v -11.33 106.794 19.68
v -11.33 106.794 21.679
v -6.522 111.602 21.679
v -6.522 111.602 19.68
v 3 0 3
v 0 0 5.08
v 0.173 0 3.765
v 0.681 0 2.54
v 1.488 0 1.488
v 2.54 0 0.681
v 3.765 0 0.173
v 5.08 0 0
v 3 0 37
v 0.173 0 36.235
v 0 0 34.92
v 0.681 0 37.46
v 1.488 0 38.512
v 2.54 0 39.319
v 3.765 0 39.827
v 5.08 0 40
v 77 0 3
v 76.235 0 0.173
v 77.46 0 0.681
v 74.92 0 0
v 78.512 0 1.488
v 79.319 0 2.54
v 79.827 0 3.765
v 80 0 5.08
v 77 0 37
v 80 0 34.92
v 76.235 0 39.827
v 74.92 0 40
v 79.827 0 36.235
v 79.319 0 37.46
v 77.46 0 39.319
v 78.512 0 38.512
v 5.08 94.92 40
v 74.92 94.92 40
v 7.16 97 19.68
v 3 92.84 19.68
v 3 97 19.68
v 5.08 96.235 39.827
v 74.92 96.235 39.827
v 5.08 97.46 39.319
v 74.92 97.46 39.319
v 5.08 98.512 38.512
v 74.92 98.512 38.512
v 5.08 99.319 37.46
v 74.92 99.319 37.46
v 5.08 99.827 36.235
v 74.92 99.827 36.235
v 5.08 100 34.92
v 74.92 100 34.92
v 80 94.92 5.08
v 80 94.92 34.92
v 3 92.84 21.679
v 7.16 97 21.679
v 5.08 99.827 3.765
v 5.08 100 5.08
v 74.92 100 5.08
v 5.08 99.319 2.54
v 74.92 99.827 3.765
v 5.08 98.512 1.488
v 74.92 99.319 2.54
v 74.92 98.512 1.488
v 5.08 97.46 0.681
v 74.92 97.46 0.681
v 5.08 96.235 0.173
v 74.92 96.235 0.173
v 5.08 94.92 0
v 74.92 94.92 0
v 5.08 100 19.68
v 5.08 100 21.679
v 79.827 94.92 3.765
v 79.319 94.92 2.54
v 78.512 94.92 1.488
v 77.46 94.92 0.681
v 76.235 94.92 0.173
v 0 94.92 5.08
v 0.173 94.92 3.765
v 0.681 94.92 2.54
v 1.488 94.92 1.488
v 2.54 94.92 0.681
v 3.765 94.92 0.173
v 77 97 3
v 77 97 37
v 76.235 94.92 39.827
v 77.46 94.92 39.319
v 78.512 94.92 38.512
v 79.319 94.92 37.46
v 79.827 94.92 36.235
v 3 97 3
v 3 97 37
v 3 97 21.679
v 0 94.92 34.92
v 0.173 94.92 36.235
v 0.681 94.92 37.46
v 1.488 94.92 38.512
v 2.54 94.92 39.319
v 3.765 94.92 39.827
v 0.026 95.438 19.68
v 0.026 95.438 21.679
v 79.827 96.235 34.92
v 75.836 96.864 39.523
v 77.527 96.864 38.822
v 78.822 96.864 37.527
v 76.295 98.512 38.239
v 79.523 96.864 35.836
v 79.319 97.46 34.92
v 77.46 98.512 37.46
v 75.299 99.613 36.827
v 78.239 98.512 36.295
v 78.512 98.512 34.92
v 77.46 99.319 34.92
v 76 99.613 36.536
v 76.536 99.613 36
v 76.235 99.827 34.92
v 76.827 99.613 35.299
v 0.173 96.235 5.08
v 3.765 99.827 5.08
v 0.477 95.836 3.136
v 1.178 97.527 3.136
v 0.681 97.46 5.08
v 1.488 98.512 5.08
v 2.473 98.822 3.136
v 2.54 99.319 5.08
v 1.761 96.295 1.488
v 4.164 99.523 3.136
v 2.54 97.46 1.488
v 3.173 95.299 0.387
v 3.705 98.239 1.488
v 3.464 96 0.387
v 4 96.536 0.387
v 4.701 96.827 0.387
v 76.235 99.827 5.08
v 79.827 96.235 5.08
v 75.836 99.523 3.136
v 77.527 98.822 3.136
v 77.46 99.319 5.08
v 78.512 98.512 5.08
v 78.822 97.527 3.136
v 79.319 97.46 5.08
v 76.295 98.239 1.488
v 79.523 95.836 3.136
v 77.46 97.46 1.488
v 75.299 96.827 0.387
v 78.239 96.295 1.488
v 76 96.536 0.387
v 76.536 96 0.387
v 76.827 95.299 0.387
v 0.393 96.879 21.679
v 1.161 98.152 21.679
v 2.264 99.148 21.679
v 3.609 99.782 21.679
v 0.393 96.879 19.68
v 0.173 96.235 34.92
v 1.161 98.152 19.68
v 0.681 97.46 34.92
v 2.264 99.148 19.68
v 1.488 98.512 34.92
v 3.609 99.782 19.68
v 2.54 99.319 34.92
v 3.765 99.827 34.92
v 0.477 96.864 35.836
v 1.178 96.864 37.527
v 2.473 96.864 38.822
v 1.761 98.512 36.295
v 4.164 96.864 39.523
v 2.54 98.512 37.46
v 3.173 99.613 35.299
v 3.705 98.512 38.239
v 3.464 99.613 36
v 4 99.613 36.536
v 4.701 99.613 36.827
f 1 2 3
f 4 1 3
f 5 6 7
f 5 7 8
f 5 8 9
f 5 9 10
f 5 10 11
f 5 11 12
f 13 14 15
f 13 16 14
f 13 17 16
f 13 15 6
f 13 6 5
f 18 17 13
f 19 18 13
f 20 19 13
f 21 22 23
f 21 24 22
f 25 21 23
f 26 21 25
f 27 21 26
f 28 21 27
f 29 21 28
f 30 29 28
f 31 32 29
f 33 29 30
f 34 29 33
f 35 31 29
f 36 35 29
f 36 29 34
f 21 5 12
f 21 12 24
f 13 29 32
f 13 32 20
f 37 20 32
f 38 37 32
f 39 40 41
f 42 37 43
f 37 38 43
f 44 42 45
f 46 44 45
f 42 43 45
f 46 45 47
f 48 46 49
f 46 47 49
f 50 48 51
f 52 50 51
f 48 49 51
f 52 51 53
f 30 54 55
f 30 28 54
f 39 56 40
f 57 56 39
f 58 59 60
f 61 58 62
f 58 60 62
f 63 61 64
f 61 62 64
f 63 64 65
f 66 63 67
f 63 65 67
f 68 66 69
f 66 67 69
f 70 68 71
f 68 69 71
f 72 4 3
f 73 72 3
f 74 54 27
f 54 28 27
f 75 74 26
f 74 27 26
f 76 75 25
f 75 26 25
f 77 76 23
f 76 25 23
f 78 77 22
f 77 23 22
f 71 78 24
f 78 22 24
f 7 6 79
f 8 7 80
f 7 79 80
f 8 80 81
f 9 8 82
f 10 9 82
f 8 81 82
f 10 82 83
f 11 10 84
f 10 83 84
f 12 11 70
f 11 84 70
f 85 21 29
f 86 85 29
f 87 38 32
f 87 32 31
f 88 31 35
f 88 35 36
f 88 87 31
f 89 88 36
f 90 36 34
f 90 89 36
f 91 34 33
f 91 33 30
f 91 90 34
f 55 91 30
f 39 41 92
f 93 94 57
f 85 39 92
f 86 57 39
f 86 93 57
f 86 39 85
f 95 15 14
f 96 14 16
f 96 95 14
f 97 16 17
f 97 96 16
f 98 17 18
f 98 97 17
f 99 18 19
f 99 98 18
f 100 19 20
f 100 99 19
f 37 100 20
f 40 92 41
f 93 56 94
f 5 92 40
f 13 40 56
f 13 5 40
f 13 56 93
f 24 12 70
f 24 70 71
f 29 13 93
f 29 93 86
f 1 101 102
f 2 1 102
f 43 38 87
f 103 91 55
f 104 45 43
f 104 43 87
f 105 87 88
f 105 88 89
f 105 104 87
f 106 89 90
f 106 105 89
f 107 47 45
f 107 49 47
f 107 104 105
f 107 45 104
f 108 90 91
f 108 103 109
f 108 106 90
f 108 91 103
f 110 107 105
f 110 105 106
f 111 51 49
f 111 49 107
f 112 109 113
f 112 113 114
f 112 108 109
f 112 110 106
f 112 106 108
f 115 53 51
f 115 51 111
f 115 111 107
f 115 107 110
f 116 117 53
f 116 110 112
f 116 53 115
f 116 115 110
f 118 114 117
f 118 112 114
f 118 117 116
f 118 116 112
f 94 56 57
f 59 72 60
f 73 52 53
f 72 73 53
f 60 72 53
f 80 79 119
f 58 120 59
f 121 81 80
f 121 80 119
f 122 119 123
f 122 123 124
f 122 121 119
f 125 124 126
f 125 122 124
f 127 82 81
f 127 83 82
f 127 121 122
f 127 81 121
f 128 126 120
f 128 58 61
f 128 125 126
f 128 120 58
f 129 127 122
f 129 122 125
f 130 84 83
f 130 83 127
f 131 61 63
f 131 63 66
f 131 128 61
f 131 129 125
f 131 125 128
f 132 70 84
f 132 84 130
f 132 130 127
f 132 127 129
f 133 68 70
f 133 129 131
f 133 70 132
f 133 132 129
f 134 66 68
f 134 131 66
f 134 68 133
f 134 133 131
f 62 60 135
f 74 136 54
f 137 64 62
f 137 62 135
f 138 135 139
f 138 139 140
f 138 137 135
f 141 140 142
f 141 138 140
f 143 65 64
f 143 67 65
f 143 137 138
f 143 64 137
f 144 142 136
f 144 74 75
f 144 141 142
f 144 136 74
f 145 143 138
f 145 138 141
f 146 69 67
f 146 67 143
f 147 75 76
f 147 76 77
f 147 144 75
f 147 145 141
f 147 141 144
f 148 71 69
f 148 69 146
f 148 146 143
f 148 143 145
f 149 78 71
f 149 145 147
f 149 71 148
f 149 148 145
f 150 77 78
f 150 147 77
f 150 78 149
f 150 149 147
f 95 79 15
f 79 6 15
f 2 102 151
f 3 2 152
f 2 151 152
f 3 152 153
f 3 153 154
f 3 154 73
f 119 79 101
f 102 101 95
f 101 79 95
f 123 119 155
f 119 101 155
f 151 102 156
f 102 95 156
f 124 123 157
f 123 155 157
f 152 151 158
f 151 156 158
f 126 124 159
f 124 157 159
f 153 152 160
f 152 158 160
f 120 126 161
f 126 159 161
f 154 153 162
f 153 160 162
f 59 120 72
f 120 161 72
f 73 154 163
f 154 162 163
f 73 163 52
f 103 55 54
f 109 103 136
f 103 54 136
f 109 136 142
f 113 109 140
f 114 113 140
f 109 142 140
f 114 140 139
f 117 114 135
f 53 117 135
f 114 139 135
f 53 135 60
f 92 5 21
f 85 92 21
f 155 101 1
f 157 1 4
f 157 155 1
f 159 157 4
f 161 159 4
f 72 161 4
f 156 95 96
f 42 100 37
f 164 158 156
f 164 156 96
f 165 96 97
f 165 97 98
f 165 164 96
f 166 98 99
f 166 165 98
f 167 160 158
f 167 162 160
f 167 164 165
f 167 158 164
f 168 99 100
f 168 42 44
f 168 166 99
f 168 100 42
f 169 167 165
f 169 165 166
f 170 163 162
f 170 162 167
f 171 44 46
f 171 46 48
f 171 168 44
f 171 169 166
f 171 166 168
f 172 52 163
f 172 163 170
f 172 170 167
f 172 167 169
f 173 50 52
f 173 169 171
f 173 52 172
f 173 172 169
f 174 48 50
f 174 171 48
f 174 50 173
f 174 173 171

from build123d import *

# Parameters (mm, degrees)
F0_W     = 80
F0_H     = 40
F1_DEPTH = 100
F2_T     = -3
F3_R     = 5.08
F4_R     = 5.08
F5_R     = 5.08
F6_R     = 5.08
F8_W     = 6.79958
F8_H     = 1.99898
F9_DEPTH = 20


with BuildPart() as f1:
    # F0 (on Front) → F1 (new body)
    with BuildSketch(Plane.XZ):
        with Locations((40, 20)):
            Rectangle(F0_W, F0_H)
    extrude(amount=-F1_DEPTH)

    # F2
    f2_openings = [f1.faces().sort_by_distance(p)[0] for p in [
        (40, 0, 20),
    ]]
    offset(amount=F2_T, openings=f2_openings)

    # F3
    f3_edges = [f1.edges().sort_by_distance(p)[0] for p in [
        (0, 50, 40),
    ]]
    fillet(f3_edges, radius=F3_R)

    # F4
    f4_edges = [f1.edges().sort_by_distance(p)[0] for p in [
        (80, 50, 40),
    ]]
    fillet(f4_edges, radius=F4_R)

    # F5
    f5_edges = [f1.edges().sort_by_distance(p)[0] for p in [
        (40, 100, 40),
    ]]
    fillet(f5_edges, radius=F5_R)

    # F6
    f6_edges = [f1.edges().sort_by_distance(p)[0] for p in [
        (40, 100, 0),
    ]]
    fillet(f6_edges, radius=F6_R)

    # F8 (on face) → F9 (join)
    with BuildSketch(Plane(origin=(-44.92, 44.92, 0), x_dir=(0.707107, 0.707107, 0), z_dir=(0.707107, -0.707107, 0))):
        with Locations((70.902991, 20.67943)):
            Rectangle(F8_W, F8_H)
    extrude(amount=-F9_DEPTH)


solid = f1.part
